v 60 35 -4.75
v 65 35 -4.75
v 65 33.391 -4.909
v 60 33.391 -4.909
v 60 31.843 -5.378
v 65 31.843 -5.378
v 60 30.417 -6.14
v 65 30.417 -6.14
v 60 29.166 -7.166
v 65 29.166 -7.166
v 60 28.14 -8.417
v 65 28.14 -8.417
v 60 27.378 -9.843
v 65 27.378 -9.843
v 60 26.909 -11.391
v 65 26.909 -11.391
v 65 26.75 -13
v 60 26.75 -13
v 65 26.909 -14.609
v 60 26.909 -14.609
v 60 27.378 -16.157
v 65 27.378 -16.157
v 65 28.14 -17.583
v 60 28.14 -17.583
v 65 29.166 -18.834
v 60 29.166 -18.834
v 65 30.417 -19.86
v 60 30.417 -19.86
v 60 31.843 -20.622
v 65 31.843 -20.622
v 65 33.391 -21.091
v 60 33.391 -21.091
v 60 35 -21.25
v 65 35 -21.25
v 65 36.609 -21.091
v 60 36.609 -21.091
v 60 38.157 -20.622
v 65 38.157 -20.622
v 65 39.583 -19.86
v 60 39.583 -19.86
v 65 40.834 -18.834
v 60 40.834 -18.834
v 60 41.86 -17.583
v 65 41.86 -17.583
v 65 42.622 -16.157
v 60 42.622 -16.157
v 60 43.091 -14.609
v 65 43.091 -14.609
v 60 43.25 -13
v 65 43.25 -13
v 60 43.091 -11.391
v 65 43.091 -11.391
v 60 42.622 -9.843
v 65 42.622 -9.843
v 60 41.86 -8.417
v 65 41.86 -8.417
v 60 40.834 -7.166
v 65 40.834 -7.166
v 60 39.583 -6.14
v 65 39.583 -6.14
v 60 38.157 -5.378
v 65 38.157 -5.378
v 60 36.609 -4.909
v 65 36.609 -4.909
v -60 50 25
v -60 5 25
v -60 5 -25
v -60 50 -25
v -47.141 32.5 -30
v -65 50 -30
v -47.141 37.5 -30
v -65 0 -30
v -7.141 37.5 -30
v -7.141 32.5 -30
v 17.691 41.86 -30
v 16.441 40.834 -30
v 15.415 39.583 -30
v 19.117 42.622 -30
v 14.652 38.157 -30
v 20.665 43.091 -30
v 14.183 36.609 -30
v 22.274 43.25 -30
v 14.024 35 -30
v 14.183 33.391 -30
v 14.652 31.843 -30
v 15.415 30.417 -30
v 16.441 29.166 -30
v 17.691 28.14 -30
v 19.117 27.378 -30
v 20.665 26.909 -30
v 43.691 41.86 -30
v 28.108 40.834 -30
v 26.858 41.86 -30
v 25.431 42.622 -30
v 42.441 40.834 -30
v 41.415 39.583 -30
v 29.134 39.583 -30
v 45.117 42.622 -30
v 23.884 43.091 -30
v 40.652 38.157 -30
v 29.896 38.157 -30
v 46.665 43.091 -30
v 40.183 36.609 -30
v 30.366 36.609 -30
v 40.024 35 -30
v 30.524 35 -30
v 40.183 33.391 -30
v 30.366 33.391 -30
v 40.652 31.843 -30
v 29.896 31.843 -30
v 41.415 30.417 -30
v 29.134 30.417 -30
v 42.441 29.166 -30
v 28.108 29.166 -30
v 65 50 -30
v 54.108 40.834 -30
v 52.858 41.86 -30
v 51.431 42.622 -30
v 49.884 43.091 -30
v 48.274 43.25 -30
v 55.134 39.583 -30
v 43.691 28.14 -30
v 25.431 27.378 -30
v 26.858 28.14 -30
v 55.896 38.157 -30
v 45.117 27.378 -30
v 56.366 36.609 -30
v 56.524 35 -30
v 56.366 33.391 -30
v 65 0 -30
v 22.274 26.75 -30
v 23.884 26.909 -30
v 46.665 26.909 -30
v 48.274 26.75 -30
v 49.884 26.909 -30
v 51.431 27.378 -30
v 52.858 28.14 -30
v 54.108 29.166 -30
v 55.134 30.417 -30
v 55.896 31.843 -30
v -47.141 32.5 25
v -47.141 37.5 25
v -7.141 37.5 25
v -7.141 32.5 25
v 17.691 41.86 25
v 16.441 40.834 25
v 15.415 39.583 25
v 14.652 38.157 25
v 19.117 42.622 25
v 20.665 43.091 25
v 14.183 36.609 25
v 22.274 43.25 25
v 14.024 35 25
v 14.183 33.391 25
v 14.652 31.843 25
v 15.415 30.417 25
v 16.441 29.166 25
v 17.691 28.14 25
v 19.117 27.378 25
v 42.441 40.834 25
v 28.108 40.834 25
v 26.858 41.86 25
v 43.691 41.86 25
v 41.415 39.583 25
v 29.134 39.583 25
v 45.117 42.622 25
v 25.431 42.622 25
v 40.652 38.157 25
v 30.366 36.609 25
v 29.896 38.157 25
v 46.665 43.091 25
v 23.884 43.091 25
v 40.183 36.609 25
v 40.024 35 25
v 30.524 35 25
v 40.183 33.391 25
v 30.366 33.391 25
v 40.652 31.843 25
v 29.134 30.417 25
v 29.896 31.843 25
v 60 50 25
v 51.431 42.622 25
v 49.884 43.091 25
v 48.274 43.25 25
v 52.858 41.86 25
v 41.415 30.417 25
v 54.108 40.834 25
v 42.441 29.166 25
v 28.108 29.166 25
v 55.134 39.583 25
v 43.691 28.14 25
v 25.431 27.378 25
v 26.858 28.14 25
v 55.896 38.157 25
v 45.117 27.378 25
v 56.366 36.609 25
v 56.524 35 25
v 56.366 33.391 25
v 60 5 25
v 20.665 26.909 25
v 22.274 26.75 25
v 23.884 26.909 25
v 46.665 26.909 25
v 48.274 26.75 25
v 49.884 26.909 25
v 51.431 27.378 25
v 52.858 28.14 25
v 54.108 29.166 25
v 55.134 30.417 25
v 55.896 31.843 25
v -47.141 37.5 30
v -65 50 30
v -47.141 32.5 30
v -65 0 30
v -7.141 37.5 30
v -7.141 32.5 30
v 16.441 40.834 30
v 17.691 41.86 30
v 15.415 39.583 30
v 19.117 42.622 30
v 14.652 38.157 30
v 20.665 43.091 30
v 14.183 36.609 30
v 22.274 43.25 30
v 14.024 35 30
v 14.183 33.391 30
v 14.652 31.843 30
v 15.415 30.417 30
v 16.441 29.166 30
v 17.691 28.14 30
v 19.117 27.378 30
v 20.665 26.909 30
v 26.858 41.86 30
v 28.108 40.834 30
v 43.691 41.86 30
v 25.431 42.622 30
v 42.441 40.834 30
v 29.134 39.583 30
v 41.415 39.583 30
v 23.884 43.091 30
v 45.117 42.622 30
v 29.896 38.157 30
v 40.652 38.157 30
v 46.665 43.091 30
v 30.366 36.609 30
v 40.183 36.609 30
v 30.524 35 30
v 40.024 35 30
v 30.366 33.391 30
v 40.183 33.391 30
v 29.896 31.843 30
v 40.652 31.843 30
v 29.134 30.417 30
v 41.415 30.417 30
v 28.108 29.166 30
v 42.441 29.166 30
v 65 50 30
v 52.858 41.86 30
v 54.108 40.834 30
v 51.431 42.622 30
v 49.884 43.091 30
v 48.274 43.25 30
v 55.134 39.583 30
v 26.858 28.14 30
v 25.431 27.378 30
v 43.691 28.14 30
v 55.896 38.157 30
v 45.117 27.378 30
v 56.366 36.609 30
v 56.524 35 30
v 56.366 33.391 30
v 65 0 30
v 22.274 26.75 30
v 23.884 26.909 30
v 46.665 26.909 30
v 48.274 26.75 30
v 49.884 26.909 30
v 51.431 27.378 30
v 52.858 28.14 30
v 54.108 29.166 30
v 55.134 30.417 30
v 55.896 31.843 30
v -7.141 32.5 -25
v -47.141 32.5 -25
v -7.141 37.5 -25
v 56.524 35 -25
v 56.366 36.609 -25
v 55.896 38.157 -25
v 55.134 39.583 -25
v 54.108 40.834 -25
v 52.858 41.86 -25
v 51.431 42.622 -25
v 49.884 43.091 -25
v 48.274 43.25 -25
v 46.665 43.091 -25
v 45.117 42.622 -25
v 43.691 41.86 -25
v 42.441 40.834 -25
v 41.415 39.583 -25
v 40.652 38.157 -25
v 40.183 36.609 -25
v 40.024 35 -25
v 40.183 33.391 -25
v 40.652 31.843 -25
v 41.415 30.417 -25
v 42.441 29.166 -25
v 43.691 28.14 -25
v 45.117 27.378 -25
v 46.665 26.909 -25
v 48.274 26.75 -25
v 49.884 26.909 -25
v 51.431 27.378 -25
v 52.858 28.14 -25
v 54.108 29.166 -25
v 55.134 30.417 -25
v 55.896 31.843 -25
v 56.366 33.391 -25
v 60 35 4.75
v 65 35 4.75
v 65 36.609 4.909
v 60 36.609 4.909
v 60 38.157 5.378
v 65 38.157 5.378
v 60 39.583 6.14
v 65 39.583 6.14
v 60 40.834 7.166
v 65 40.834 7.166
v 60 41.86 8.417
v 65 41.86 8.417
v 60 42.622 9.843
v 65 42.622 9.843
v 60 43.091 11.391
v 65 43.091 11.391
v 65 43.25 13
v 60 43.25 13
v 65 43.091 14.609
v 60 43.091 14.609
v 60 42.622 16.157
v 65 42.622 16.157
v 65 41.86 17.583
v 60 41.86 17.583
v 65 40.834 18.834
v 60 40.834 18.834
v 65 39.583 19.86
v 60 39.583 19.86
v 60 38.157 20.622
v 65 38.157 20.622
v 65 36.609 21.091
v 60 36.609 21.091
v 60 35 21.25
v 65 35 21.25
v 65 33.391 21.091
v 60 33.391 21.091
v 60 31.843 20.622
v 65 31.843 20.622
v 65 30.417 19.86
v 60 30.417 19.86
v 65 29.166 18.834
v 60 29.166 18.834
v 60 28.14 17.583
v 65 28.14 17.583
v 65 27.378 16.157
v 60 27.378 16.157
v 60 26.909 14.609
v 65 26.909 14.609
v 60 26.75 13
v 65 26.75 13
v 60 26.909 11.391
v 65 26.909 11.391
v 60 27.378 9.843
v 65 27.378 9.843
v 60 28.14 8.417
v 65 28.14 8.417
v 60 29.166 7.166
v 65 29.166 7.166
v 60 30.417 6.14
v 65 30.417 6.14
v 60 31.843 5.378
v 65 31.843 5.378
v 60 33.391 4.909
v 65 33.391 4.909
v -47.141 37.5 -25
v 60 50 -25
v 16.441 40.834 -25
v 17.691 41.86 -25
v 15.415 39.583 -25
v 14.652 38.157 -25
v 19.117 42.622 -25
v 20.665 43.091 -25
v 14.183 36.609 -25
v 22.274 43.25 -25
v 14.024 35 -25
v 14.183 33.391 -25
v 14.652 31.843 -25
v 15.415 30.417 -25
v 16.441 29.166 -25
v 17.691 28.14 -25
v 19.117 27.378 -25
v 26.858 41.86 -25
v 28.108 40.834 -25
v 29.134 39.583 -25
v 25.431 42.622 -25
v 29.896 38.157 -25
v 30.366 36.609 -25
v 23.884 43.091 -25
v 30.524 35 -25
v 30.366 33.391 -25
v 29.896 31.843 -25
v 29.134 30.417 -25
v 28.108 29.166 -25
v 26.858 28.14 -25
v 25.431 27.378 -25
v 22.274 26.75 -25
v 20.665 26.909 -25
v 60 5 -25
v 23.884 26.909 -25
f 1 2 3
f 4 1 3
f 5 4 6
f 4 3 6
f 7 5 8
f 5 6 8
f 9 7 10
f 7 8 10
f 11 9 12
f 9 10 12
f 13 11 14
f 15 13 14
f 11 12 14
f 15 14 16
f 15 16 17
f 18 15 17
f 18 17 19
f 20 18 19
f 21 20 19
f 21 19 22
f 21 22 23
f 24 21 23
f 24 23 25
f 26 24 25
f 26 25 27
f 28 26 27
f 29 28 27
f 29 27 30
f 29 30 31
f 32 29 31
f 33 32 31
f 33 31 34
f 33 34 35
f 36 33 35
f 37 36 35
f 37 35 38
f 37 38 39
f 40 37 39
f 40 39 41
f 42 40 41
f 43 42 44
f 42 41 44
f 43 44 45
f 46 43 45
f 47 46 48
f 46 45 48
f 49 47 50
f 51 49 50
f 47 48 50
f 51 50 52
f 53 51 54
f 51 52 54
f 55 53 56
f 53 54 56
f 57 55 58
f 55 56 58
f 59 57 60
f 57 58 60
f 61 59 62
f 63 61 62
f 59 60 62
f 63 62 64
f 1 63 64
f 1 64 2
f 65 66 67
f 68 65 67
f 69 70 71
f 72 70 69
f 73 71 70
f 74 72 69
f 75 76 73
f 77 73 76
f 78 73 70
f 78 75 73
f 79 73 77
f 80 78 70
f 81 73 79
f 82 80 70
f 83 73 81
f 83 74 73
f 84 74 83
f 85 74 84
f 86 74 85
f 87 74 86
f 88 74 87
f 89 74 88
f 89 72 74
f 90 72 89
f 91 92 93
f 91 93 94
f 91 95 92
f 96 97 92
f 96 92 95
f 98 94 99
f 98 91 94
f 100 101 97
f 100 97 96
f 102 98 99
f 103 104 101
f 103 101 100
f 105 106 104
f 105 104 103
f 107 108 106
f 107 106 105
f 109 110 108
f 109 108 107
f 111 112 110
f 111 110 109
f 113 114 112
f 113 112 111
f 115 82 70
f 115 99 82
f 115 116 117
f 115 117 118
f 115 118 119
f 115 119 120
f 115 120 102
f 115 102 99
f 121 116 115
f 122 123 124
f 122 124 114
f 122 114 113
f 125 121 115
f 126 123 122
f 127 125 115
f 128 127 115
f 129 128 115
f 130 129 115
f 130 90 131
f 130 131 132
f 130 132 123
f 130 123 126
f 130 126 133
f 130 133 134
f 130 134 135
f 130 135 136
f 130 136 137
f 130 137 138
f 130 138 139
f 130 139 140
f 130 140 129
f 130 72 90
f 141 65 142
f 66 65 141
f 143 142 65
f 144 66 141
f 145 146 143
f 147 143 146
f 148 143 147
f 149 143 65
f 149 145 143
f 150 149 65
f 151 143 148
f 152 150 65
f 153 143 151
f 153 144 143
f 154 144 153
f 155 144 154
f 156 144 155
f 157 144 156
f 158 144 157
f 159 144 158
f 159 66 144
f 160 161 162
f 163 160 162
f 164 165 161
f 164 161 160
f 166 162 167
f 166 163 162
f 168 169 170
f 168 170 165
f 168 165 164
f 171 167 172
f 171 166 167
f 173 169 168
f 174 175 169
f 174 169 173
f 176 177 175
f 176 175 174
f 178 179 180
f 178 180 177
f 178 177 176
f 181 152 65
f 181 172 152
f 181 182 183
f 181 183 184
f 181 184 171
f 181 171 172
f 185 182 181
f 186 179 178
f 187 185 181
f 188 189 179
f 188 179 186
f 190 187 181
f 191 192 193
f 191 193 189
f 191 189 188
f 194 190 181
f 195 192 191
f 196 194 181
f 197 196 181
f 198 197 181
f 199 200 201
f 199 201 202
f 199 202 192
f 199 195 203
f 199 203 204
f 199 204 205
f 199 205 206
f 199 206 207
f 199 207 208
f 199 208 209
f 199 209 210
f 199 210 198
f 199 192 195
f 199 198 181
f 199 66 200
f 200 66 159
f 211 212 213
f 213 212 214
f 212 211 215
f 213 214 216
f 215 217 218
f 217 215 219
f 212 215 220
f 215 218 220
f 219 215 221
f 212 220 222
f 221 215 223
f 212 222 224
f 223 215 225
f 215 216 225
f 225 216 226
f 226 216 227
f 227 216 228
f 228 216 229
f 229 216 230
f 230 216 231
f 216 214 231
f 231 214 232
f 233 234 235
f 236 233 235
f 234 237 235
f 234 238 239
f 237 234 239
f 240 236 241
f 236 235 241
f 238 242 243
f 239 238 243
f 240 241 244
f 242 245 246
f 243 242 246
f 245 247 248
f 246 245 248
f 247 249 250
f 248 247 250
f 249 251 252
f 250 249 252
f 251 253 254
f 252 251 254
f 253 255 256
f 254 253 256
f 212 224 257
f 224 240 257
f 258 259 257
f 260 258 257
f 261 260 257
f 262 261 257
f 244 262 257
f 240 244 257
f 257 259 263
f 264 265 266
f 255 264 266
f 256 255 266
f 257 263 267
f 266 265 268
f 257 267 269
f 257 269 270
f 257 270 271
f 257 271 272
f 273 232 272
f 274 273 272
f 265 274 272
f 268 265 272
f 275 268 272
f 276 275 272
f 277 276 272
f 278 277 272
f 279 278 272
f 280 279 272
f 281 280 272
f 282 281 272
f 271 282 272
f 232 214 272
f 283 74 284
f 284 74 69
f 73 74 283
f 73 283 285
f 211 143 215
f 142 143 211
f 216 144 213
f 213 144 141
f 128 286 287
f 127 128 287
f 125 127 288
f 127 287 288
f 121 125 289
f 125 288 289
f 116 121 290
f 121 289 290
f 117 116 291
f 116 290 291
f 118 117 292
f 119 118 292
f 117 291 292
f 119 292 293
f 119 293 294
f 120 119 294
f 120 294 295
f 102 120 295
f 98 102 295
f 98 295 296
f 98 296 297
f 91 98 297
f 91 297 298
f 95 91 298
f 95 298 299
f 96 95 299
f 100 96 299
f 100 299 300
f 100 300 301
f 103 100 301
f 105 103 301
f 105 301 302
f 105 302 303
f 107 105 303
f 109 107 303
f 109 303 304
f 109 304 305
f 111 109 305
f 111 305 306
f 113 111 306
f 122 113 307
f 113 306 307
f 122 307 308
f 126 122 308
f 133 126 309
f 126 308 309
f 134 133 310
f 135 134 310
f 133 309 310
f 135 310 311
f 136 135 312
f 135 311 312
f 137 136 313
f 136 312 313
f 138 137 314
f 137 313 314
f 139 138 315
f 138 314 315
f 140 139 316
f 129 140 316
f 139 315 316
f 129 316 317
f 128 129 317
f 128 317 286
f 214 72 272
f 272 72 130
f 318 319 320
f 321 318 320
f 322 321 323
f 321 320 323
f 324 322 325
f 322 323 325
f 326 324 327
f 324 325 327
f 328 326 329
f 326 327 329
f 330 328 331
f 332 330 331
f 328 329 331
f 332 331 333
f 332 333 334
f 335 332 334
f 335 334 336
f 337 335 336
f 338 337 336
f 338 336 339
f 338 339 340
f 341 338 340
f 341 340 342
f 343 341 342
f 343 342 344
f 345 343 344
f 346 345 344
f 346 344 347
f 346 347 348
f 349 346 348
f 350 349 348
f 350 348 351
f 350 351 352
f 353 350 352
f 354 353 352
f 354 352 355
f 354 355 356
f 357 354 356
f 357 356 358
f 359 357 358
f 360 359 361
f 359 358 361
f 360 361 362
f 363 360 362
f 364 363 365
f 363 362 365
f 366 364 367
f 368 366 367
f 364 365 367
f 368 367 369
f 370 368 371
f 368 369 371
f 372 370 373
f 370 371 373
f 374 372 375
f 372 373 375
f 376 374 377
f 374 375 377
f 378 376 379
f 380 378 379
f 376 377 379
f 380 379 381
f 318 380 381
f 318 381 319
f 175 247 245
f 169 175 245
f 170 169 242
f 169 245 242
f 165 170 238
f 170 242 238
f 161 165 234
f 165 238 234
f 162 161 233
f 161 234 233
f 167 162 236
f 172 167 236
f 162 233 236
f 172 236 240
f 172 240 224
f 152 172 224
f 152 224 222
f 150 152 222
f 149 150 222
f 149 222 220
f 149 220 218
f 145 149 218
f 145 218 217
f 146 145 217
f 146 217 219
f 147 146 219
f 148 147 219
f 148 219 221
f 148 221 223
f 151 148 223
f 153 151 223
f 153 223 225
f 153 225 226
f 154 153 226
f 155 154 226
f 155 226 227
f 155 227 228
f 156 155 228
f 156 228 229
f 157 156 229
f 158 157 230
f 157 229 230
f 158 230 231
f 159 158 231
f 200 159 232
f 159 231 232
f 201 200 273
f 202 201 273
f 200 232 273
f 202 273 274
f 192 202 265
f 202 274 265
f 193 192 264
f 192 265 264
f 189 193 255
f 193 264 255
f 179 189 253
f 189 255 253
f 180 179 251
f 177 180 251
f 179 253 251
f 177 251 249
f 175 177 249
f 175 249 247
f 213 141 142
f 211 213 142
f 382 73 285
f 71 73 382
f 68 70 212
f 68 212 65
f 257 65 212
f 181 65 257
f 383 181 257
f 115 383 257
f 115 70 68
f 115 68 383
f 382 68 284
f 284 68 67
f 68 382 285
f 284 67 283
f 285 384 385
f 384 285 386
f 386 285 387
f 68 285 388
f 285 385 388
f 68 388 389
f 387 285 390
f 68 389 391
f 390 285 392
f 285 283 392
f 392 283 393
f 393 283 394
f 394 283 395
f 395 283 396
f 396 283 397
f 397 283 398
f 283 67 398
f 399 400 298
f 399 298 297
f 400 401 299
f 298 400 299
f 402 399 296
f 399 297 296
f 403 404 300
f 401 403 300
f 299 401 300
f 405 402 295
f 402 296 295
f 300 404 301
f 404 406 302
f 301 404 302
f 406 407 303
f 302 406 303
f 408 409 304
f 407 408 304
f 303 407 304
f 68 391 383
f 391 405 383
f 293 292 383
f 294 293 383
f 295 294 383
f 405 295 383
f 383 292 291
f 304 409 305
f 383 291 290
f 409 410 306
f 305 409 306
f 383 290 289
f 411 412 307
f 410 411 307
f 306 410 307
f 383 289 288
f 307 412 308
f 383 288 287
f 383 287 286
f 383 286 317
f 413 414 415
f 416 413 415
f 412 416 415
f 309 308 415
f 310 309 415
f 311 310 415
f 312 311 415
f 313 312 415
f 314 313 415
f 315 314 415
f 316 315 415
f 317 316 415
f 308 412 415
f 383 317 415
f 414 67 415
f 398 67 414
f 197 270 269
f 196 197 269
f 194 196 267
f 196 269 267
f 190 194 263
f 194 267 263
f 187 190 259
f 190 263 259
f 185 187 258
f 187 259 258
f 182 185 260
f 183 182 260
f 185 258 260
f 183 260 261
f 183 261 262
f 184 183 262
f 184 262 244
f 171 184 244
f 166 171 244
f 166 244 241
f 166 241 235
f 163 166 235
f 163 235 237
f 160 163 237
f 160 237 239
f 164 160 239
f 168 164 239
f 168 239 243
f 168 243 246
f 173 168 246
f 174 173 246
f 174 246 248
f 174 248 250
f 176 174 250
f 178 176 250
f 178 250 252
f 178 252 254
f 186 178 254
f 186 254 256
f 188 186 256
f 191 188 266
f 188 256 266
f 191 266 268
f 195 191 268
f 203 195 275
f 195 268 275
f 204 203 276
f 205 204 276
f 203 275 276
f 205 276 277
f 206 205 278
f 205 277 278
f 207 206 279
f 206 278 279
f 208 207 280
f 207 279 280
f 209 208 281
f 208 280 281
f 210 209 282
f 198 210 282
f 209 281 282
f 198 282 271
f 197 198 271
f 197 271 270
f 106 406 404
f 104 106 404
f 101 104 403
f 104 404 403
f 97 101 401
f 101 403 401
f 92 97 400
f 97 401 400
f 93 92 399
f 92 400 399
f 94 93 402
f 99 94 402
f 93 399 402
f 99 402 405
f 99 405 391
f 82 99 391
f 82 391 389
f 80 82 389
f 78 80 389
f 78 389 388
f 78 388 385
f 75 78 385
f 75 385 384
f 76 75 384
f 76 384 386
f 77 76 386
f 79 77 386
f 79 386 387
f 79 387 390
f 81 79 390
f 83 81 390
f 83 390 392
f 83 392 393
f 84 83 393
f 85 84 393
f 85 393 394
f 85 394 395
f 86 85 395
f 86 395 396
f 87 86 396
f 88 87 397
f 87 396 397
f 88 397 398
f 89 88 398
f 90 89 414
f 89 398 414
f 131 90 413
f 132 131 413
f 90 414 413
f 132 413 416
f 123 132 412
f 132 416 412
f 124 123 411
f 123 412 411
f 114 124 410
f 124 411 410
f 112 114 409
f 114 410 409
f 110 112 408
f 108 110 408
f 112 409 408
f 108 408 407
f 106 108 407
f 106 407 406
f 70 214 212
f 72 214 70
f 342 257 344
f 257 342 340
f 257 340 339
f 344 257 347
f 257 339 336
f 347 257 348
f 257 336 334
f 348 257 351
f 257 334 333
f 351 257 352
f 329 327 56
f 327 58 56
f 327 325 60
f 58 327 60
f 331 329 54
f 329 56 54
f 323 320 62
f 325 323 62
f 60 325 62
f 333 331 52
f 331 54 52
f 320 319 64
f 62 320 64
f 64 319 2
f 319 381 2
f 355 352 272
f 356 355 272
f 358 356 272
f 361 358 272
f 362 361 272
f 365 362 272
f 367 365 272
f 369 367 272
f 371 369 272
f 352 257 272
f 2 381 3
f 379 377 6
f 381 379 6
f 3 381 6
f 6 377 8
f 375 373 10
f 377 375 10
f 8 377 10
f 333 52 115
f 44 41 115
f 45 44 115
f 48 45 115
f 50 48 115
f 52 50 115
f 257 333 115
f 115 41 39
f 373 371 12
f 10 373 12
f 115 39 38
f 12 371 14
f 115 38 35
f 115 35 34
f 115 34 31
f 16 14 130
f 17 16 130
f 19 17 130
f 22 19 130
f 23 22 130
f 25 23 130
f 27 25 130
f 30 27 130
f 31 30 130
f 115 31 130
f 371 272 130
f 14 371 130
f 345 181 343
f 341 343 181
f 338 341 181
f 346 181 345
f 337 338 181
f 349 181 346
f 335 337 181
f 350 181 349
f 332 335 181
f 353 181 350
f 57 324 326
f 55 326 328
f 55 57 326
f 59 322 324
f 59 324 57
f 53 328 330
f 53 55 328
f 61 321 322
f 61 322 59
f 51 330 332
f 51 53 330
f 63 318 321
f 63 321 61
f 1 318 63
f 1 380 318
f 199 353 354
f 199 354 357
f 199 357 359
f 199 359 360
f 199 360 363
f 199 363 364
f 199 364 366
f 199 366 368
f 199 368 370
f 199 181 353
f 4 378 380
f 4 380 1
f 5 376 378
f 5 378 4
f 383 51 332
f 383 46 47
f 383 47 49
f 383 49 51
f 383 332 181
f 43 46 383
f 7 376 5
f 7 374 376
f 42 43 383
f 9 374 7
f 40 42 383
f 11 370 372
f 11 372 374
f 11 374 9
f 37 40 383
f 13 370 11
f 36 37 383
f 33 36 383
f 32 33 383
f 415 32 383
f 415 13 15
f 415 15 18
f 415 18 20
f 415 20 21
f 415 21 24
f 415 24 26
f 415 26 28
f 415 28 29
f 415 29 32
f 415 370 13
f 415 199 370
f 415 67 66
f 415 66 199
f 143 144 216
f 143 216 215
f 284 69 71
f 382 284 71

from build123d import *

# Parameters (mm, degrees)
SKETCH1_W           = 130
SKETCH1_H           = 60
BOSS_EXTRUDE2_DEPTH = 50
SHELL1_T            = -5
CUT_EXTRUDE1_REACH  = 132
SKETCH2_R           = 8.25
SKETCH3_R           = 8.25
CUT_EXTRUDE2_DEPTH  = 61
SKETCH4_W           = 40
SKETCH4_H           = 5
CUT_EXTRUDE3_DEPTH  = 61


with BuildPart() as part:
    # Sketch1 → Boss-Extrude2 (new body)
    with BuildSketch(Plane(origin=(0, 0, 0), x_dir=(1, 0, 0), z_dir=(0, 1, 0))):
        Rectangle(SKETCH1_W, SKETCH1_H)
    extrude(amount=BOSS_EXTRUDE2_DEPTH)

    # Shell1
    shell1_openings = [part.faces().sort_by_distance(p)[0] for p in [
        (0, 50, 0),
    ]]
    offset(amount=SHELL1_T, openings=shell1_openings, kind=Kind.INTERSECTION)

    # Sketch2 → Cut-Extrude1 (cut, up to next)
    with BuildSketch(Plane(origin=(65, 0, 0), x_dir=(0, 0, -1), z_dir=(1, 0, 0)), mode=Mode.PRIVATE) as cut_extrude1_sk1:
        with Locations((-13, 35)):
            Circle(SKETCH2_R)
    cut_extrude1_tool1 = extrude(cut_extrude1_sk1.sketch, amount=-CUT_EXTRUDE1_REACH, mode=Mode.PRIVATE) & part.part
    add(cut_extrude1_tool1.solids().sort_by_distance((65, 35, 13))[0], mode=Mode.SUBTRACT)
    # Sketch2 → Cut-Extrude1 (cut, up to next)
    with BuildSketch(Plane(origin=(65, 0, 0), x_dir=(0, 0, -1), z_dir=(1, 0, 0)), mode=Mode.PRIVATE) as cut_extrude1_sk2:
        with BuildLine():
            ThreePointArc((21.25, 35), (13, 43.25), (4.75, 35))
            ThreePointArc((4.75, 35), (13, 26.75), (21.25, 35))
        make_face()
    cut_extrude1_tool2 = extrude(cut_extrude1_sk2.sketch, amount=-CUT_EXTRUDE1_REACH, mode=Mode.PRIVATE) & part.part
    add(cut_extrude1_tool2.solids().sort_by_distance((65, 35, -13))[0], mode=Mode.SUBTRACT)

    # Sketch3 → Cut-Extrude2 (cut, through all)
    with BuildSketch(Plane.XY.offset(30)):
        with Locations((22.274243645, 35)):
            Circle(SKETCH3_R)
        with Locations((48.274243645, 35)):
            Circle(SKETCH3_R)
    extrude(amount=-CUT_EXTRUDE2_DEPTH, mode=Mode.SUBTRACT)

    # Sketch4 → Cut-Extrude3 (cut, through all)
    with BuildSketch(Plane(origin=(0, 0, -30), x_dir=(-1, 0, 0), z_dir=(0, 0, -1))):
        with Locations((27.140672083, 35)):
            Rectangle(SKETCH4_W, SKETCH4_H)
    extrude(amount=-CUT_EXTRUDE3_DEPTH, mode=Mode.SUBTRACT)


solid = part.part
